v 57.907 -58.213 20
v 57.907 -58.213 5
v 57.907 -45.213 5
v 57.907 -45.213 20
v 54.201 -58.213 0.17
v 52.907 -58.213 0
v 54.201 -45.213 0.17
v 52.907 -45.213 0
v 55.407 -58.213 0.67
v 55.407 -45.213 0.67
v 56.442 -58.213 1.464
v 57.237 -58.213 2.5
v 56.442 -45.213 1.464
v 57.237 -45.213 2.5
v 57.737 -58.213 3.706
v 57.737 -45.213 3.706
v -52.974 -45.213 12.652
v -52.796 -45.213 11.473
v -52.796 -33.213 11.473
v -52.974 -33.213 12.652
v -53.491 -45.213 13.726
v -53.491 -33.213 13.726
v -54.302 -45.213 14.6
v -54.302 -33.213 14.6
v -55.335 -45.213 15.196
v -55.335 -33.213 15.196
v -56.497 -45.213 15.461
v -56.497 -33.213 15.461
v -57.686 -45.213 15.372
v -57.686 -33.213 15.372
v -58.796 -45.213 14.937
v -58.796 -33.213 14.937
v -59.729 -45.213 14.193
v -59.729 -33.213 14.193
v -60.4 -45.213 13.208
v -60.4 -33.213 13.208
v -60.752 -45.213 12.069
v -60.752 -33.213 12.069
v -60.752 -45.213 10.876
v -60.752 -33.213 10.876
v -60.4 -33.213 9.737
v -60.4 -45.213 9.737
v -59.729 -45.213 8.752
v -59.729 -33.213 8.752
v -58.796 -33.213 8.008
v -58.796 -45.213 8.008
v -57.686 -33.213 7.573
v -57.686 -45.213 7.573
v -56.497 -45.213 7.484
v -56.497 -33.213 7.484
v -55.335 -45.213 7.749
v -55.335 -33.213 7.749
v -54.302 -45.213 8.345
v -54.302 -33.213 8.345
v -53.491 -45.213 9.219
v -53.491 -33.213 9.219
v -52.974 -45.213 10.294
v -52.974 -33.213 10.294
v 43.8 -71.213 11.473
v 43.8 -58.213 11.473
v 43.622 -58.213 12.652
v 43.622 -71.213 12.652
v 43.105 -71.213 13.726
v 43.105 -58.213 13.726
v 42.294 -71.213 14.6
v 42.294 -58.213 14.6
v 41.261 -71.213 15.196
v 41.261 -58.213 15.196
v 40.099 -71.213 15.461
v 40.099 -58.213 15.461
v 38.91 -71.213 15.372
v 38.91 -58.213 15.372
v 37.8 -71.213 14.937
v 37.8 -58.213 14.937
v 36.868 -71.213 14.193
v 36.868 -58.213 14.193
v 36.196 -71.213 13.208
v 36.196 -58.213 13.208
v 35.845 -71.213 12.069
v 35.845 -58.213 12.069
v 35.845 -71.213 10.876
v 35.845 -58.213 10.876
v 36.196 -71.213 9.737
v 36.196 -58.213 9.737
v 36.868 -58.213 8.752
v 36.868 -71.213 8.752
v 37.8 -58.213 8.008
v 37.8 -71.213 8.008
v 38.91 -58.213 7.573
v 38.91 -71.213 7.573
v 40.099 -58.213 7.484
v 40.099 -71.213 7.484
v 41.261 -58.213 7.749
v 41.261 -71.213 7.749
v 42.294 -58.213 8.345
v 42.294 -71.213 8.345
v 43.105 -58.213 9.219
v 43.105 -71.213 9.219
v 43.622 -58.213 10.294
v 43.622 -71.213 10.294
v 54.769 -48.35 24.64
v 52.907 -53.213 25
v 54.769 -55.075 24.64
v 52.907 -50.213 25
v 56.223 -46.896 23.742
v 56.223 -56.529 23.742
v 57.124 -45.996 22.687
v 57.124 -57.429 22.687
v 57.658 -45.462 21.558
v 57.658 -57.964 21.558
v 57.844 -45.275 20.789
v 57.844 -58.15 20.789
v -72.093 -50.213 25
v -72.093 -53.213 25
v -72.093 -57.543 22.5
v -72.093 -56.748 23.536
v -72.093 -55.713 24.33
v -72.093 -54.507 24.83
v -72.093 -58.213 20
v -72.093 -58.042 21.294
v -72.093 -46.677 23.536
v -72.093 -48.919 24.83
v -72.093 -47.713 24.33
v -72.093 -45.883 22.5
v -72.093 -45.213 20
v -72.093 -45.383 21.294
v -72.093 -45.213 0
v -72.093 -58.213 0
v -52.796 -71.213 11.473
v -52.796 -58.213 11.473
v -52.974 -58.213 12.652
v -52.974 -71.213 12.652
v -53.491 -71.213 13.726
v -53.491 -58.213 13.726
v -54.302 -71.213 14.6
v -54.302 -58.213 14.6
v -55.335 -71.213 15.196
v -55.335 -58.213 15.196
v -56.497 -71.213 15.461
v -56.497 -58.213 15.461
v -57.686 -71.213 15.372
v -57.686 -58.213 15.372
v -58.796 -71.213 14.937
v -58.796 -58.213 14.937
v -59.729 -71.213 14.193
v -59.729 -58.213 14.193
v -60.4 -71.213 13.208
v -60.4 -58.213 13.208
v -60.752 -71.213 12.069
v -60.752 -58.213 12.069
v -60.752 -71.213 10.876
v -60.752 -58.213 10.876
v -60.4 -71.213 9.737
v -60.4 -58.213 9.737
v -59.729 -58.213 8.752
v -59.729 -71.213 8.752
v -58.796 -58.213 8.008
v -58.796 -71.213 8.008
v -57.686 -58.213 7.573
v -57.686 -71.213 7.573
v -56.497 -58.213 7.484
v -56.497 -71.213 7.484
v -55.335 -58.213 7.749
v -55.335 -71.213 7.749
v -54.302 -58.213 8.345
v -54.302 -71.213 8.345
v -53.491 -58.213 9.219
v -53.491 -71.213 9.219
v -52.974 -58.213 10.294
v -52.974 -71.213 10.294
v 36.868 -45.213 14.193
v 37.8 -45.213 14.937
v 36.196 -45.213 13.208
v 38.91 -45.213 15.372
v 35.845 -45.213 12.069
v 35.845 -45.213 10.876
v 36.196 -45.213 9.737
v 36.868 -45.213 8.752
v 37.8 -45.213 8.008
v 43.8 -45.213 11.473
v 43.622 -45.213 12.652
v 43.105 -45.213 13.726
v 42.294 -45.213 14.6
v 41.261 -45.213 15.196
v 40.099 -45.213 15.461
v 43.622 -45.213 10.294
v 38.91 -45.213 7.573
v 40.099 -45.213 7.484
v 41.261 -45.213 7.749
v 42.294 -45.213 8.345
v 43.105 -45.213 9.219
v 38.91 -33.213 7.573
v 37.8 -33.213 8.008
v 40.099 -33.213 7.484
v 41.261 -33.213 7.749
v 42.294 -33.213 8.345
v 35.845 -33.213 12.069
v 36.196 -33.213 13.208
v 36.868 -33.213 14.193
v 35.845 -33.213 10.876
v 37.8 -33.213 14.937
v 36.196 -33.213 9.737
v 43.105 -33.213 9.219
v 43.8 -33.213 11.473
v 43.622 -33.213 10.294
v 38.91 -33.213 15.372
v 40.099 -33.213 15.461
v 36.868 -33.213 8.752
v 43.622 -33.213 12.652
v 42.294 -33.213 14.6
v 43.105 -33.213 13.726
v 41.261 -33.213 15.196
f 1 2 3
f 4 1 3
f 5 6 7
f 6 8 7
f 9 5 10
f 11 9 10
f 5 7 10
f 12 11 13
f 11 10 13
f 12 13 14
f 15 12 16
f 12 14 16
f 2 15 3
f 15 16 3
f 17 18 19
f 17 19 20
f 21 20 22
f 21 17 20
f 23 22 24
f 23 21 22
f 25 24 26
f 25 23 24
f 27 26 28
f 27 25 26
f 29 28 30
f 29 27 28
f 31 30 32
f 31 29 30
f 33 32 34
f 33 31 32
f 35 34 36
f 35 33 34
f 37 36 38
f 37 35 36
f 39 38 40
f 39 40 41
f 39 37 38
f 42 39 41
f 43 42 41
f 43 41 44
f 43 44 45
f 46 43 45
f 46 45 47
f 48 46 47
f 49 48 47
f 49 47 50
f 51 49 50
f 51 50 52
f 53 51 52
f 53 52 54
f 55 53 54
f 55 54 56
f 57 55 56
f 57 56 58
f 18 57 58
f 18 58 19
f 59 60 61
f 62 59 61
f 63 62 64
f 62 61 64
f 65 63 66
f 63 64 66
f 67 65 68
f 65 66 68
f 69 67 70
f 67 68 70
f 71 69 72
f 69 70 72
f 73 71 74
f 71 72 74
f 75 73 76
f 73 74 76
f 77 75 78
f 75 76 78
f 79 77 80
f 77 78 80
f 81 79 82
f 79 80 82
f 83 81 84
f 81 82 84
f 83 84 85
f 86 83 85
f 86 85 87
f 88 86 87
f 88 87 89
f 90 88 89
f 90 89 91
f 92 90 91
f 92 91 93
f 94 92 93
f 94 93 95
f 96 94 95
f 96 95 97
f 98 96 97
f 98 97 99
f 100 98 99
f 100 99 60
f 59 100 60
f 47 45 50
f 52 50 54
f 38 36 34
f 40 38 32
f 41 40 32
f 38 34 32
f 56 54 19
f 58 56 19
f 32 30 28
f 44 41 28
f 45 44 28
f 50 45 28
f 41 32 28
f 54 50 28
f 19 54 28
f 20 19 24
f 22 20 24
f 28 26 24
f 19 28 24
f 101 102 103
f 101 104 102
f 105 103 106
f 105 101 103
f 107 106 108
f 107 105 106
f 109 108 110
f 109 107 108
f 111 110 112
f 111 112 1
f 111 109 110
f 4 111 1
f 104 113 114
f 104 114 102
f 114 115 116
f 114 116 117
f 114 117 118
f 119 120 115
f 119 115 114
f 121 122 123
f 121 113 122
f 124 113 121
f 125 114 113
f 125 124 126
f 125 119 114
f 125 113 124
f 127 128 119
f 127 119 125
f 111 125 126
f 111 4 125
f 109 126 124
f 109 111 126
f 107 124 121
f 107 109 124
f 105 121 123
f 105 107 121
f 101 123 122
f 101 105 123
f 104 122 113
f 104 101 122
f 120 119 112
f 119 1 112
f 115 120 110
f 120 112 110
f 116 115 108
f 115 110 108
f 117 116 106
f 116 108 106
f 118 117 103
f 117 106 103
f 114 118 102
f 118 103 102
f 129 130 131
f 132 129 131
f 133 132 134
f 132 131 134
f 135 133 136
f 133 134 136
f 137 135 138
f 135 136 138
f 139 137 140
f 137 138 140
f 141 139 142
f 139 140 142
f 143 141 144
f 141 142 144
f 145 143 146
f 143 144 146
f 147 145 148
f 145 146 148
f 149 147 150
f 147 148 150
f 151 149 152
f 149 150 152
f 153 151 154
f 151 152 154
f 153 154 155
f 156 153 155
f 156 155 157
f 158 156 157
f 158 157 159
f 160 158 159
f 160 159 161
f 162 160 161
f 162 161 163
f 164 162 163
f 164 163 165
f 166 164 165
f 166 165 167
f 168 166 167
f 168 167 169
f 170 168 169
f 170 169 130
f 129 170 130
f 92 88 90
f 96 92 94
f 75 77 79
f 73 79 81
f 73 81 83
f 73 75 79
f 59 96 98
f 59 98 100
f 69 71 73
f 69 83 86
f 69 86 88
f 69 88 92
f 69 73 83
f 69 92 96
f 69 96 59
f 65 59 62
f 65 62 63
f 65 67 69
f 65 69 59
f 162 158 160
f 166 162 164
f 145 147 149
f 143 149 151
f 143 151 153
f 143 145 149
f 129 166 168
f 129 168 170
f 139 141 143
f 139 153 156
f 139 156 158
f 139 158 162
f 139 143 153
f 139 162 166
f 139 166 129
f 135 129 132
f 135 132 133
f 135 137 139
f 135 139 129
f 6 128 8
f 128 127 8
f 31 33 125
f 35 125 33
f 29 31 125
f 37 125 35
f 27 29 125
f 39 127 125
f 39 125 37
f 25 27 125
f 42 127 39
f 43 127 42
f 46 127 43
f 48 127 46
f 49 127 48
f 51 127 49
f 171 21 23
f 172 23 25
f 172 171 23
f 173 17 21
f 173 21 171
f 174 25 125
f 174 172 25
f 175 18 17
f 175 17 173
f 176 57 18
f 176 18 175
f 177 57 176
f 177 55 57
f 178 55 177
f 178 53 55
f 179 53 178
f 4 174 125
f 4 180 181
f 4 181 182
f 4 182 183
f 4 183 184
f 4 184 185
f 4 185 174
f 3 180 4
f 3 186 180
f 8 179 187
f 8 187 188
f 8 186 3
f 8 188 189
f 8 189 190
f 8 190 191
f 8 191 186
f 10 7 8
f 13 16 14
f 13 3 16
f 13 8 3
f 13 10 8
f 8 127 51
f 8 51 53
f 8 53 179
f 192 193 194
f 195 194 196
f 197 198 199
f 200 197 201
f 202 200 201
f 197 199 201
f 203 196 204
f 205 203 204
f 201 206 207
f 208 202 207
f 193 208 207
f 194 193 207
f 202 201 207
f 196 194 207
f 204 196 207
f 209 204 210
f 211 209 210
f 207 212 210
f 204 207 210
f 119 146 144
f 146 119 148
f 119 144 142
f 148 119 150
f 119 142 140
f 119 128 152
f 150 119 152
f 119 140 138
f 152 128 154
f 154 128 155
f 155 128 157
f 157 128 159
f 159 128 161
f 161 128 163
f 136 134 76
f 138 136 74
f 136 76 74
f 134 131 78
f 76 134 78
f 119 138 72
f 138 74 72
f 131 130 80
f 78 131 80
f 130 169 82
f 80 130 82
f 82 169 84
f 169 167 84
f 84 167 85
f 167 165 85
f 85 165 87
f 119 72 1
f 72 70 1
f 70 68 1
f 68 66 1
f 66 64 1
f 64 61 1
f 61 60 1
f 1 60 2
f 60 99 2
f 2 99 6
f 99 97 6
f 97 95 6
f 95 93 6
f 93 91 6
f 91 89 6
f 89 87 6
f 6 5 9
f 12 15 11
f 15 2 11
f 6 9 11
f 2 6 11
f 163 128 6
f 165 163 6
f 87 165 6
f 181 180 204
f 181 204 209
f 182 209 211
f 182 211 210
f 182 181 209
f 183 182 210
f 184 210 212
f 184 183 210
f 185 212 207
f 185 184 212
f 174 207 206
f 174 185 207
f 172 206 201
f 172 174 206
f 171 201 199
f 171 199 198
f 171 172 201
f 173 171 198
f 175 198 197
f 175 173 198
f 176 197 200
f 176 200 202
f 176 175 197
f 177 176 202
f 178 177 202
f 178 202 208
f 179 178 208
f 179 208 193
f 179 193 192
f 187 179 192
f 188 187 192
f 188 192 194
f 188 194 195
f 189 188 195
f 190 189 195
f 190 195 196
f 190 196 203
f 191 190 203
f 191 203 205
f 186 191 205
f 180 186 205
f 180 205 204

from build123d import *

# Parameters (mm, degrees)
F0_W          = 130
F0_H          = 13
F1_DEPTH      = 25
F2_R          = 4
F3_DEPTH      = 25
F3_FACE_R     = 4
F4_DEPTH      = 99.4
F5_R          = 5
F6_R          = 4
F7_DEPTH      = 13
F7_DEPTH_BACK = 25


with BuildPart() as f1:
    # F0 (on Top) → F1 (new body)
    with BuildSketch(Plane.XY):
        with Locations((-7.093077, -51.712683)):
            Rectangle(F0_W, F0_H)
    extrude(amount=F1_DEPTH)

    # F2 (on face) → F3 (join)
    with BuildSketch(Plane(origin=(0, -45.212683, 0), x_dir=(-1, 0, 0), z_dir=(0, 1, 0))):
        with Locations((-39.799914, 11.472573)):
            Circle(F2_R)
        with Locations((56.796312, 11.472573)):
            Circle(F2_R)
    extrude(amount=F3_DEPTH)

    # F3_face (on face) → F4 (cut)
    with BuildSketch(Plane(origin=(39.799914, -20.212683, 11.472573), x_dir=(-1, 0, 0), z_dir=(0, 1, 0))):
        Circle(F3_FACE_R)
        with Locations((96.596226, 0)):
            Circle(F3_FACE_R)
    extrude(amount=-F4_DEPTH, mode=Mode.SUBTRACT)

    # F5
    f5_edges = [f1.edges().sort_by_distance(p)[0] for p in [
        (57.906923, -51.712683, 25),
        (57.906923, -51.712683, 0),
        (-7.093077, -58.212683, 25),
        (-7.093077, -45.212683, 25),
    ]]
    fillet(f5_edges, radius=F5_R)

    # F6 (on face) → F7 (join, two sides)
    with BuildSketch(Plane.XZ.offset(58.212683)) as f7_sk:
        with Locations((-56.796312, 11.472573)):
            Circle(F6_R)
        with Locations((39.799914, 11.472573)):
            Circle(F6_R)
    extrude(amount=F7_DEPTH)
    extrude(f7_sk.sketch, amount=-F7_DEPTH_BACK)


solid = f1.part
